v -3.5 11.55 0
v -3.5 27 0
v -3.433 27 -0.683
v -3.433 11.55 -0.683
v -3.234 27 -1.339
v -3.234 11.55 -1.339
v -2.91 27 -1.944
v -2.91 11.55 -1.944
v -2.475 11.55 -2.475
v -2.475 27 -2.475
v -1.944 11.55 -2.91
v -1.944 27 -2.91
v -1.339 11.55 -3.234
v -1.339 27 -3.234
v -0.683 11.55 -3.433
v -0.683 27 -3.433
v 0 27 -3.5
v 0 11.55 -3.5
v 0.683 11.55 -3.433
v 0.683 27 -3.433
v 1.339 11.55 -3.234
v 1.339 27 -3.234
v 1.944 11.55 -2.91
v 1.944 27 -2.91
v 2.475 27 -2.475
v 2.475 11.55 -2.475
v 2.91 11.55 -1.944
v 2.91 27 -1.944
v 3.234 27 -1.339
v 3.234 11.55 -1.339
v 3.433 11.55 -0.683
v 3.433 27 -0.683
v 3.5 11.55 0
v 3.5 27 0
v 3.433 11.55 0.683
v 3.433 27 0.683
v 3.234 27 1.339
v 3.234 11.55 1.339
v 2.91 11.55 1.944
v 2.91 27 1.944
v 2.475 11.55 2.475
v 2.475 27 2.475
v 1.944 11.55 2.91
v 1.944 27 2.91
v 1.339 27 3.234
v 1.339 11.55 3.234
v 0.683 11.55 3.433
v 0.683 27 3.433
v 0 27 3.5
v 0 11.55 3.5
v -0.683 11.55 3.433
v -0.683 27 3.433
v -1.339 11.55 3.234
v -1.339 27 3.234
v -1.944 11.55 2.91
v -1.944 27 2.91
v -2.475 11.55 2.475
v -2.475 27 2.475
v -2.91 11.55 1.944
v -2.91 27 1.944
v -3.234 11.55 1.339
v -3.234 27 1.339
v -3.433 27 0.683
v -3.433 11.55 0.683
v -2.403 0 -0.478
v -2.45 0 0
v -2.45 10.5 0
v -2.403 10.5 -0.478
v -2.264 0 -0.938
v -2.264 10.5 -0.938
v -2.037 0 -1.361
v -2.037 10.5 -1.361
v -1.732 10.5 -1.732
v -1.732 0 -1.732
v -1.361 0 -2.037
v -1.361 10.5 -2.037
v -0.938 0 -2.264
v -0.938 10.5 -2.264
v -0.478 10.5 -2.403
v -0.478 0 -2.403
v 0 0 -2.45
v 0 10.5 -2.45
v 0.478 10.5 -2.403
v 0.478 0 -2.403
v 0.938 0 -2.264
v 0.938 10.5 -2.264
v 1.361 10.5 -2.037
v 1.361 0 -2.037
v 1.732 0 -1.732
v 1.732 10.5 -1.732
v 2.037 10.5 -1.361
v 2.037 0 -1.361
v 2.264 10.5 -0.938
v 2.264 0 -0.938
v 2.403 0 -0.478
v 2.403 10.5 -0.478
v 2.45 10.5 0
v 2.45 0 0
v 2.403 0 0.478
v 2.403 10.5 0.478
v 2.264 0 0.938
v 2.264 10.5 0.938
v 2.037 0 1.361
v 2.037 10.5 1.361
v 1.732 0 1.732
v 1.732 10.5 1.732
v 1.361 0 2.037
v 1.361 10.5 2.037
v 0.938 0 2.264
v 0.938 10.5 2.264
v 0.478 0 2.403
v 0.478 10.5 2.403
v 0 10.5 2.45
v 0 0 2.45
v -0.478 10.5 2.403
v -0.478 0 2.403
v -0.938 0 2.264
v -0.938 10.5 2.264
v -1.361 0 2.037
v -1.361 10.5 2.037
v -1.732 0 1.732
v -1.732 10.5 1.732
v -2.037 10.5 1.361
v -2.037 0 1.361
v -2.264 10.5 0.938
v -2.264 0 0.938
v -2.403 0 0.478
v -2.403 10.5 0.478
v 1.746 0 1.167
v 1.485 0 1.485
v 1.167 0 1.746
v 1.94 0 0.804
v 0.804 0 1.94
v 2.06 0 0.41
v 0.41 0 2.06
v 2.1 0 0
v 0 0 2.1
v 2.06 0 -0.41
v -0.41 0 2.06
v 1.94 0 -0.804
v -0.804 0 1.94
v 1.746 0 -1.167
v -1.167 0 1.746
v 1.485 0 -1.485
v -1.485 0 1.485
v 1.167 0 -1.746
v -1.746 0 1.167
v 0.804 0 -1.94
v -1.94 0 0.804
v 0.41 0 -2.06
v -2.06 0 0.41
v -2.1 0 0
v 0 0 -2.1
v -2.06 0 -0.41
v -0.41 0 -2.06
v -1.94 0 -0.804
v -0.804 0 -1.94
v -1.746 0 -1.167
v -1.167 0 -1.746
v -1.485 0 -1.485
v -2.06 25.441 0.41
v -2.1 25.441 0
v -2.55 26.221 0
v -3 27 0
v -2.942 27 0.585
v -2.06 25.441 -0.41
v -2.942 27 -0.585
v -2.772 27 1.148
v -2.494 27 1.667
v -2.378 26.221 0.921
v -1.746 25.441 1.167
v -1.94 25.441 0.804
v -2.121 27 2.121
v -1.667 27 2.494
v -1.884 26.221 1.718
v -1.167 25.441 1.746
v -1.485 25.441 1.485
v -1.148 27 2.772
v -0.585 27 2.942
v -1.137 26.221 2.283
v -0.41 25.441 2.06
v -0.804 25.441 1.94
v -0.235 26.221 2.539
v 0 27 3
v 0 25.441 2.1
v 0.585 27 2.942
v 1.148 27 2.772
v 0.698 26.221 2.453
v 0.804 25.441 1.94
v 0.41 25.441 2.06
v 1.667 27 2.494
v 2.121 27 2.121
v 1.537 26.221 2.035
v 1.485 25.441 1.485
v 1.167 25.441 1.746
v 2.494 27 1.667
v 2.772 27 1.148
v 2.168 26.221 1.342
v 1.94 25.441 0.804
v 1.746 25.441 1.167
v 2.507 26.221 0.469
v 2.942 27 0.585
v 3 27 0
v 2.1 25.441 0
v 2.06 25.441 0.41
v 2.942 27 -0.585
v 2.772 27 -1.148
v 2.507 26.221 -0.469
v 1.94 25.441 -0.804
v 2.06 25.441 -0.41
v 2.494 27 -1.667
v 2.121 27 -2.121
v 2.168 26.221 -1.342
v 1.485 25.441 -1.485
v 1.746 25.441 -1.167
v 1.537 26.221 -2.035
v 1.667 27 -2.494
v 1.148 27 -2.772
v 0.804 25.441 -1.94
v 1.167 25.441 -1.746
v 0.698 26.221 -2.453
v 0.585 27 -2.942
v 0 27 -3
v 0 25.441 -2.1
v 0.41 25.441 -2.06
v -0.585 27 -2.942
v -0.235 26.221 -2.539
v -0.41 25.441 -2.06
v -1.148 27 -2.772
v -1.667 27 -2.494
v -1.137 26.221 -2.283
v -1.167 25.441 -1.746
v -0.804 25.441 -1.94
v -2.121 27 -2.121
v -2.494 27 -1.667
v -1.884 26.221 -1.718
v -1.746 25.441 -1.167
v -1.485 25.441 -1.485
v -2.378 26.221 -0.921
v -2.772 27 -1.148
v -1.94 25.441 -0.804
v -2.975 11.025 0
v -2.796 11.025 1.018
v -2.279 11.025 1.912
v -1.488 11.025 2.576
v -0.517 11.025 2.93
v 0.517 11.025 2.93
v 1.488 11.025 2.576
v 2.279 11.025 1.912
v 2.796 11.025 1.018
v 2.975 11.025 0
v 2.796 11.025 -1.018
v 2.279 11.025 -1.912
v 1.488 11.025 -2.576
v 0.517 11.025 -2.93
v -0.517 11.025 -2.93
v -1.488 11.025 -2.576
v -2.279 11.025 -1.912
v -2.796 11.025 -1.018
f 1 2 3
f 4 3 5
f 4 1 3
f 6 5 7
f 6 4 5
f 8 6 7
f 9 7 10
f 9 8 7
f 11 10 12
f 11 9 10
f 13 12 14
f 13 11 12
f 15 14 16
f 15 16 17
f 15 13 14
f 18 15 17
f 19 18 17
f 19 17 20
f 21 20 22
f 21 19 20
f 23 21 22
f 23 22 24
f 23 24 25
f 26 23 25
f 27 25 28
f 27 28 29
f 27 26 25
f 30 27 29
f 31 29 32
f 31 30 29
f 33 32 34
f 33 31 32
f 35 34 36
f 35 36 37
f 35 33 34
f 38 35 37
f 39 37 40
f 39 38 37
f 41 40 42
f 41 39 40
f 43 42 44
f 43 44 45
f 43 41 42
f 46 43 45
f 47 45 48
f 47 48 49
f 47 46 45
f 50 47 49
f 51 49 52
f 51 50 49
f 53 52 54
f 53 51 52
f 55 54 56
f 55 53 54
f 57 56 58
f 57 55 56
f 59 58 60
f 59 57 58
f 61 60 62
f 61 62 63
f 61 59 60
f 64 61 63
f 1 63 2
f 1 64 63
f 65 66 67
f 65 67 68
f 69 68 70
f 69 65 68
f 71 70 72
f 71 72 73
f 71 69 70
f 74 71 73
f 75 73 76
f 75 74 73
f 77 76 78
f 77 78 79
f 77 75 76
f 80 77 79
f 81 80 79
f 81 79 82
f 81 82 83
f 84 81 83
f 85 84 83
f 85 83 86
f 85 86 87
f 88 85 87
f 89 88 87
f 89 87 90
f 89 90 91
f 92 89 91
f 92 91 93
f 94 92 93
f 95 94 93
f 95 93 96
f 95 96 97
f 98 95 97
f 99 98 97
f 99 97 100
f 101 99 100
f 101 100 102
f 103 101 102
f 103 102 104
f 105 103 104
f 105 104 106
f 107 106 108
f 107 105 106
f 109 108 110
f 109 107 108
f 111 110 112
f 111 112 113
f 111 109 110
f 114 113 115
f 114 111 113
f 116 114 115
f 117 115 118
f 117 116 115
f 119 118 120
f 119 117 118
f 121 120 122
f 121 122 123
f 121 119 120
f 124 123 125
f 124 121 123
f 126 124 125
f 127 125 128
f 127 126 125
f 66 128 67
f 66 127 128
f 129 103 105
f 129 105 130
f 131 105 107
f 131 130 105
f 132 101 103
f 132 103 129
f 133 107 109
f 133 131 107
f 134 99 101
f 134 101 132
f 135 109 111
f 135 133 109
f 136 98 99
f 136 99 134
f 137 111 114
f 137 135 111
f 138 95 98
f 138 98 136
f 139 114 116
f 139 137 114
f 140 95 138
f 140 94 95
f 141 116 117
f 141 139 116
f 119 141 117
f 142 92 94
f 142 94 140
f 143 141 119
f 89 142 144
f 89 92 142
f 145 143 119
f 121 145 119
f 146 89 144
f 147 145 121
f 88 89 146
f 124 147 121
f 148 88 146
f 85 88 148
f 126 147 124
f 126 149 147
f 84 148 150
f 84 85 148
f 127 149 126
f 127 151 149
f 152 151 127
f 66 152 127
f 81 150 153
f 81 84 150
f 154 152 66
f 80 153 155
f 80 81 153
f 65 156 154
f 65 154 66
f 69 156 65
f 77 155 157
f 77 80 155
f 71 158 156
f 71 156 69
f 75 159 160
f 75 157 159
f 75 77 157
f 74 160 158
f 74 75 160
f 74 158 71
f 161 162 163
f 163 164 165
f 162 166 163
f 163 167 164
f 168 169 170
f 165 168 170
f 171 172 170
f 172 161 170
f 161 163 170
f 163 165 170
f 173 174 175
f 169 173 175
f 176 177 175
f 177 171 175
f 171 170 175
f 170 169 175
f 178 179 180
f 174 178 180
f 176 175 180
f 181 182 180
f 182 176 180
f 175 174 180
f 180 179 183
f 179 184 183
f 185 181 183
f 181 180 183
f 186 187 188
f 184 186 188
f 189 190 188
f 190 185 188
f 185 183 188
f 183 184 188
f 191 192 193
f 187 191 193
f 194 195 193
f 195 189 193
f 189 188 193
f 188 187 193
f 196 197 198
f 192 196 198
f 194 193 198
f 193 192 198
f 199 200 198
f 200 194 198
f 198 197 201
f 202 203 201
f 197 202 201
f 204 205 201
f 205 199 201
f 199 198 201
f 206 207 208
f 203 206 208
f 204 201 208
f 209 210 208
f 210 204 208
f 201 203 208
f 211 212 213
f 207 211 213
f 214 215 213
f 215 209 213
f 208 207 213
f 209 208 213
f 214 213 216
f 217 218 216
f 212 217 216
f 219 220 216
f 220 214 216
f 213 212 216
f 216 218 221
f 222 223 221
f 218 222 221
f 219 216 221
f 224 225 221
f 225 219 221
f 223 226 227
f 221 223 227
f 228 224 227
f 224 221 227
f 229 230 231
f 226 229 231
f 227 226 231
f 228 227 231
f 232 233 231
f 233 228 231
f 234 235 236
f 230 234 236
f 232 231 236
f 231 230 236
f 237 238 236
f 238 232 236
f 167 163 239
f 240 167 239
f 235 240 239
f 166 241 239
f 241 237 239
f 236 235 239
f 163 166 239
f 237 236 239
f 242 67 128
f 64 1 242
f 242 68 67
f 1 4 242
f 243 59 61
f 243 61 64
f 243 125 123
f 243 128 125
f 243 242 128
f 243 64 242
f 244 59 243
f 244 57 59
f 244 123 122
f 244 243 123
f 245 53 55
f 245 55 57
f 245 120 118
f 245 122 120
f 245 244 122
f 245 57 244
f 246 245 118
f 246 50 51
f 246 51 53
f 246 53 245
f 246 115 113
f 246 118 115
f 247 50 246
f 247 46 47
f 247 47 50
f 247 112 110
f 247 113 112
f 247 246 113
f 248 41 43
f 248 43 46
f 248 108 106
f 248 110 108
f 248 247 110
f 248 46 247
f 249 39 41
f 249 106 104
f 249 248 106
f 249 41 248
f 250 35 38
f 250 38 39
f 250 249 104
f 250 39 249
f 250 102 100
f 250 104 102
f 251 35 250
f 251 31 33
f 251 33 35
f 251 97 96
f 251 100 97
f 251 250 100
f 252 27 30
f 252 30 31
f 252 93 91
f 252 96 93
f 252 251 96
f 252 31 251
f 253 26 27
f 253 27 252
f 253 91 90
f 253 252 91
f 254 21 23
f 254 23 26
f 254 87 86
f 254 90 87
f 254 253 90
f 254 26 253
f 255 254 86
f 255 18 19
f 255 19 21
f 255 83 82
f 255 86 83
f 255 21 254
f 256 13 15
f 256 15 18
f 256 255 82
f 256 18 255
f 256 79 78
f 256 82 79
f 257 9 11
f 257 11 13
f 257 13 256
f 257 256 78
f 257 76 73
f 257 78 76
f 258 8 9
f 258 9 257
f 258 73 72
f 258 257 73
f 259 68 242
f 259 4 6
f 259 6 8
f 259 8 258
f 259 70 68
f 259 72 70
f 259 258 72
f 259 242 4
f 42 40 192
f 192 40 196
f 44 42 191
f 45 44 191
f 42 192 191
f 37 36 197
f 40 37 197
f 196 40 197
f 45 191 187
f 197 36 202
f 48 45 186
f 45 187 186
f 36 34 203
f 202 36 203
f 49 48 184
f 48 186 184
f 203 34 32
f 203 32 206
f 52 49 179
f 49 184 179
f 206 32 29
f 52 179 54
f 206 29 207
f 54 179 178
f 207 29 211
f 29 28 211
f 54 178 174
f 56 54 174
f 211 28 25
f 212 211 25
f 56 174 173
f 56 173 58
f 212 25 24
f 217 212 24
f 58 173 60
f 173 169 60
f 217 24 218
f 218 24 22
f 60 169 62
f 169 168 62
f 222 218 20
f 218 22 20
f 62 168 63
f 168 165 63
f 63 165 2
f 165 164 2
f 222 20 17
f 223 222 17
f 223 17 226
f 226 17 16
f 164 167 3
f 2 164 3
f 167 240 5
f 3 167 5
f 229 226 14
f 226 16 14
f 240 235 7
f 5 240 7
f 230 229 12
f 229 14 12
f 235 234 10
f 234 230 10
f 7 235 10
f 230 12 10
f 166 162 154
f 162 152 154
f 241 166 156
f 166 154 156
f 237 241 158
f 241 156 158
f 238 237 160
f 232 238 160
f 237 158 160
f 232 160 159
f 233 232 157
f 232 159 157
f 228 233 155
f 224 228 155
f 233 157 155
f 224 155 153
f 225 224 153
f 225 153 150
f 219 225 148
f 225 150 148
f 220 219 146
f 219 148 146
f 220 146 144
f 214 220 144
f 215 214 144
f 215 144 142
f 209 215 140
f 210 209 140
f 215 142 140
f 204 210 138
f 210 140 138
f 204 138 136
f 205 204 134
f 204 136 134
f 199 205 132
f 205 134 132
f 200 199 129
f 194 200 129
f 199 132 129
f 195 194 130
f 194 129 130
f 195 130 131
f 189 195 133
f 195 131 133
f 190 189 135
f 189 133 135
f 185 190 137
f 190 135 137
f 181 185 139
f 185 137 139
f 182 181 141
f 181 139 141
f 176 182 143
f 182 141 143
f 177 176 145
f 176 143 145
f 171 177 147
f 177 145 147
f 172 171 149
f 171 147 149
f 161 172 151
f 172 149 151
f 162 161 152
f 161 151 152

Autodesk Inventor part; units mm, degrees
ref_plane "YZ Plane" through (0, 0, 0) normal (1, 0, 0) x (0, 1, 0)
ref_plane "XZ Plane" through (0, 0, 0) normal (0, 1, 0) x (-1, 0, 0)
ref_plane "XY Plane" through (0, 0, 0) normal (0, 0, 1) x (1, 0, 0)
sketch "Sketch1" plane through (0, 0, 0) normal (0, 0, 1) x (1, 0, 0)
  line L0 (-3.5, 27) -> (-3.5, 11.55)
  line L1 (-3.5, 11.55) -> (-2.45, 10.5)
  line L2 (-2.45, 10.5) -> (-2.45, 0)
  line L3 (-2.45, 0) -> (0, 0)
  line L4 (0, 27) -> (0, 0) construction
  line L5 (-3, 27) -> (-2.1, 25.4412)
  line L6 (-2.1, 25.4412) -> (-2.1, 0)
  line L7 (-3, 27) -> (-3.5, 27)
  dimension "d1" = 10.5
  dimension "d2" = 2.45
  dimension "d3" = 3.5
  dimension "d4" = 30
  dimension "d5" = 2.1
  dimension "d6" = 135
  dimension "d7" = 0.5
  dimension "d8" = 27
revolve "Revolution1" add sketch "Sketch1" angle 360 about axis through (0, 27, 0) along (0, -1, 0)
properties part number "ENDER 3 HEATBREAK" material "Aluminum 6061, Welded"
